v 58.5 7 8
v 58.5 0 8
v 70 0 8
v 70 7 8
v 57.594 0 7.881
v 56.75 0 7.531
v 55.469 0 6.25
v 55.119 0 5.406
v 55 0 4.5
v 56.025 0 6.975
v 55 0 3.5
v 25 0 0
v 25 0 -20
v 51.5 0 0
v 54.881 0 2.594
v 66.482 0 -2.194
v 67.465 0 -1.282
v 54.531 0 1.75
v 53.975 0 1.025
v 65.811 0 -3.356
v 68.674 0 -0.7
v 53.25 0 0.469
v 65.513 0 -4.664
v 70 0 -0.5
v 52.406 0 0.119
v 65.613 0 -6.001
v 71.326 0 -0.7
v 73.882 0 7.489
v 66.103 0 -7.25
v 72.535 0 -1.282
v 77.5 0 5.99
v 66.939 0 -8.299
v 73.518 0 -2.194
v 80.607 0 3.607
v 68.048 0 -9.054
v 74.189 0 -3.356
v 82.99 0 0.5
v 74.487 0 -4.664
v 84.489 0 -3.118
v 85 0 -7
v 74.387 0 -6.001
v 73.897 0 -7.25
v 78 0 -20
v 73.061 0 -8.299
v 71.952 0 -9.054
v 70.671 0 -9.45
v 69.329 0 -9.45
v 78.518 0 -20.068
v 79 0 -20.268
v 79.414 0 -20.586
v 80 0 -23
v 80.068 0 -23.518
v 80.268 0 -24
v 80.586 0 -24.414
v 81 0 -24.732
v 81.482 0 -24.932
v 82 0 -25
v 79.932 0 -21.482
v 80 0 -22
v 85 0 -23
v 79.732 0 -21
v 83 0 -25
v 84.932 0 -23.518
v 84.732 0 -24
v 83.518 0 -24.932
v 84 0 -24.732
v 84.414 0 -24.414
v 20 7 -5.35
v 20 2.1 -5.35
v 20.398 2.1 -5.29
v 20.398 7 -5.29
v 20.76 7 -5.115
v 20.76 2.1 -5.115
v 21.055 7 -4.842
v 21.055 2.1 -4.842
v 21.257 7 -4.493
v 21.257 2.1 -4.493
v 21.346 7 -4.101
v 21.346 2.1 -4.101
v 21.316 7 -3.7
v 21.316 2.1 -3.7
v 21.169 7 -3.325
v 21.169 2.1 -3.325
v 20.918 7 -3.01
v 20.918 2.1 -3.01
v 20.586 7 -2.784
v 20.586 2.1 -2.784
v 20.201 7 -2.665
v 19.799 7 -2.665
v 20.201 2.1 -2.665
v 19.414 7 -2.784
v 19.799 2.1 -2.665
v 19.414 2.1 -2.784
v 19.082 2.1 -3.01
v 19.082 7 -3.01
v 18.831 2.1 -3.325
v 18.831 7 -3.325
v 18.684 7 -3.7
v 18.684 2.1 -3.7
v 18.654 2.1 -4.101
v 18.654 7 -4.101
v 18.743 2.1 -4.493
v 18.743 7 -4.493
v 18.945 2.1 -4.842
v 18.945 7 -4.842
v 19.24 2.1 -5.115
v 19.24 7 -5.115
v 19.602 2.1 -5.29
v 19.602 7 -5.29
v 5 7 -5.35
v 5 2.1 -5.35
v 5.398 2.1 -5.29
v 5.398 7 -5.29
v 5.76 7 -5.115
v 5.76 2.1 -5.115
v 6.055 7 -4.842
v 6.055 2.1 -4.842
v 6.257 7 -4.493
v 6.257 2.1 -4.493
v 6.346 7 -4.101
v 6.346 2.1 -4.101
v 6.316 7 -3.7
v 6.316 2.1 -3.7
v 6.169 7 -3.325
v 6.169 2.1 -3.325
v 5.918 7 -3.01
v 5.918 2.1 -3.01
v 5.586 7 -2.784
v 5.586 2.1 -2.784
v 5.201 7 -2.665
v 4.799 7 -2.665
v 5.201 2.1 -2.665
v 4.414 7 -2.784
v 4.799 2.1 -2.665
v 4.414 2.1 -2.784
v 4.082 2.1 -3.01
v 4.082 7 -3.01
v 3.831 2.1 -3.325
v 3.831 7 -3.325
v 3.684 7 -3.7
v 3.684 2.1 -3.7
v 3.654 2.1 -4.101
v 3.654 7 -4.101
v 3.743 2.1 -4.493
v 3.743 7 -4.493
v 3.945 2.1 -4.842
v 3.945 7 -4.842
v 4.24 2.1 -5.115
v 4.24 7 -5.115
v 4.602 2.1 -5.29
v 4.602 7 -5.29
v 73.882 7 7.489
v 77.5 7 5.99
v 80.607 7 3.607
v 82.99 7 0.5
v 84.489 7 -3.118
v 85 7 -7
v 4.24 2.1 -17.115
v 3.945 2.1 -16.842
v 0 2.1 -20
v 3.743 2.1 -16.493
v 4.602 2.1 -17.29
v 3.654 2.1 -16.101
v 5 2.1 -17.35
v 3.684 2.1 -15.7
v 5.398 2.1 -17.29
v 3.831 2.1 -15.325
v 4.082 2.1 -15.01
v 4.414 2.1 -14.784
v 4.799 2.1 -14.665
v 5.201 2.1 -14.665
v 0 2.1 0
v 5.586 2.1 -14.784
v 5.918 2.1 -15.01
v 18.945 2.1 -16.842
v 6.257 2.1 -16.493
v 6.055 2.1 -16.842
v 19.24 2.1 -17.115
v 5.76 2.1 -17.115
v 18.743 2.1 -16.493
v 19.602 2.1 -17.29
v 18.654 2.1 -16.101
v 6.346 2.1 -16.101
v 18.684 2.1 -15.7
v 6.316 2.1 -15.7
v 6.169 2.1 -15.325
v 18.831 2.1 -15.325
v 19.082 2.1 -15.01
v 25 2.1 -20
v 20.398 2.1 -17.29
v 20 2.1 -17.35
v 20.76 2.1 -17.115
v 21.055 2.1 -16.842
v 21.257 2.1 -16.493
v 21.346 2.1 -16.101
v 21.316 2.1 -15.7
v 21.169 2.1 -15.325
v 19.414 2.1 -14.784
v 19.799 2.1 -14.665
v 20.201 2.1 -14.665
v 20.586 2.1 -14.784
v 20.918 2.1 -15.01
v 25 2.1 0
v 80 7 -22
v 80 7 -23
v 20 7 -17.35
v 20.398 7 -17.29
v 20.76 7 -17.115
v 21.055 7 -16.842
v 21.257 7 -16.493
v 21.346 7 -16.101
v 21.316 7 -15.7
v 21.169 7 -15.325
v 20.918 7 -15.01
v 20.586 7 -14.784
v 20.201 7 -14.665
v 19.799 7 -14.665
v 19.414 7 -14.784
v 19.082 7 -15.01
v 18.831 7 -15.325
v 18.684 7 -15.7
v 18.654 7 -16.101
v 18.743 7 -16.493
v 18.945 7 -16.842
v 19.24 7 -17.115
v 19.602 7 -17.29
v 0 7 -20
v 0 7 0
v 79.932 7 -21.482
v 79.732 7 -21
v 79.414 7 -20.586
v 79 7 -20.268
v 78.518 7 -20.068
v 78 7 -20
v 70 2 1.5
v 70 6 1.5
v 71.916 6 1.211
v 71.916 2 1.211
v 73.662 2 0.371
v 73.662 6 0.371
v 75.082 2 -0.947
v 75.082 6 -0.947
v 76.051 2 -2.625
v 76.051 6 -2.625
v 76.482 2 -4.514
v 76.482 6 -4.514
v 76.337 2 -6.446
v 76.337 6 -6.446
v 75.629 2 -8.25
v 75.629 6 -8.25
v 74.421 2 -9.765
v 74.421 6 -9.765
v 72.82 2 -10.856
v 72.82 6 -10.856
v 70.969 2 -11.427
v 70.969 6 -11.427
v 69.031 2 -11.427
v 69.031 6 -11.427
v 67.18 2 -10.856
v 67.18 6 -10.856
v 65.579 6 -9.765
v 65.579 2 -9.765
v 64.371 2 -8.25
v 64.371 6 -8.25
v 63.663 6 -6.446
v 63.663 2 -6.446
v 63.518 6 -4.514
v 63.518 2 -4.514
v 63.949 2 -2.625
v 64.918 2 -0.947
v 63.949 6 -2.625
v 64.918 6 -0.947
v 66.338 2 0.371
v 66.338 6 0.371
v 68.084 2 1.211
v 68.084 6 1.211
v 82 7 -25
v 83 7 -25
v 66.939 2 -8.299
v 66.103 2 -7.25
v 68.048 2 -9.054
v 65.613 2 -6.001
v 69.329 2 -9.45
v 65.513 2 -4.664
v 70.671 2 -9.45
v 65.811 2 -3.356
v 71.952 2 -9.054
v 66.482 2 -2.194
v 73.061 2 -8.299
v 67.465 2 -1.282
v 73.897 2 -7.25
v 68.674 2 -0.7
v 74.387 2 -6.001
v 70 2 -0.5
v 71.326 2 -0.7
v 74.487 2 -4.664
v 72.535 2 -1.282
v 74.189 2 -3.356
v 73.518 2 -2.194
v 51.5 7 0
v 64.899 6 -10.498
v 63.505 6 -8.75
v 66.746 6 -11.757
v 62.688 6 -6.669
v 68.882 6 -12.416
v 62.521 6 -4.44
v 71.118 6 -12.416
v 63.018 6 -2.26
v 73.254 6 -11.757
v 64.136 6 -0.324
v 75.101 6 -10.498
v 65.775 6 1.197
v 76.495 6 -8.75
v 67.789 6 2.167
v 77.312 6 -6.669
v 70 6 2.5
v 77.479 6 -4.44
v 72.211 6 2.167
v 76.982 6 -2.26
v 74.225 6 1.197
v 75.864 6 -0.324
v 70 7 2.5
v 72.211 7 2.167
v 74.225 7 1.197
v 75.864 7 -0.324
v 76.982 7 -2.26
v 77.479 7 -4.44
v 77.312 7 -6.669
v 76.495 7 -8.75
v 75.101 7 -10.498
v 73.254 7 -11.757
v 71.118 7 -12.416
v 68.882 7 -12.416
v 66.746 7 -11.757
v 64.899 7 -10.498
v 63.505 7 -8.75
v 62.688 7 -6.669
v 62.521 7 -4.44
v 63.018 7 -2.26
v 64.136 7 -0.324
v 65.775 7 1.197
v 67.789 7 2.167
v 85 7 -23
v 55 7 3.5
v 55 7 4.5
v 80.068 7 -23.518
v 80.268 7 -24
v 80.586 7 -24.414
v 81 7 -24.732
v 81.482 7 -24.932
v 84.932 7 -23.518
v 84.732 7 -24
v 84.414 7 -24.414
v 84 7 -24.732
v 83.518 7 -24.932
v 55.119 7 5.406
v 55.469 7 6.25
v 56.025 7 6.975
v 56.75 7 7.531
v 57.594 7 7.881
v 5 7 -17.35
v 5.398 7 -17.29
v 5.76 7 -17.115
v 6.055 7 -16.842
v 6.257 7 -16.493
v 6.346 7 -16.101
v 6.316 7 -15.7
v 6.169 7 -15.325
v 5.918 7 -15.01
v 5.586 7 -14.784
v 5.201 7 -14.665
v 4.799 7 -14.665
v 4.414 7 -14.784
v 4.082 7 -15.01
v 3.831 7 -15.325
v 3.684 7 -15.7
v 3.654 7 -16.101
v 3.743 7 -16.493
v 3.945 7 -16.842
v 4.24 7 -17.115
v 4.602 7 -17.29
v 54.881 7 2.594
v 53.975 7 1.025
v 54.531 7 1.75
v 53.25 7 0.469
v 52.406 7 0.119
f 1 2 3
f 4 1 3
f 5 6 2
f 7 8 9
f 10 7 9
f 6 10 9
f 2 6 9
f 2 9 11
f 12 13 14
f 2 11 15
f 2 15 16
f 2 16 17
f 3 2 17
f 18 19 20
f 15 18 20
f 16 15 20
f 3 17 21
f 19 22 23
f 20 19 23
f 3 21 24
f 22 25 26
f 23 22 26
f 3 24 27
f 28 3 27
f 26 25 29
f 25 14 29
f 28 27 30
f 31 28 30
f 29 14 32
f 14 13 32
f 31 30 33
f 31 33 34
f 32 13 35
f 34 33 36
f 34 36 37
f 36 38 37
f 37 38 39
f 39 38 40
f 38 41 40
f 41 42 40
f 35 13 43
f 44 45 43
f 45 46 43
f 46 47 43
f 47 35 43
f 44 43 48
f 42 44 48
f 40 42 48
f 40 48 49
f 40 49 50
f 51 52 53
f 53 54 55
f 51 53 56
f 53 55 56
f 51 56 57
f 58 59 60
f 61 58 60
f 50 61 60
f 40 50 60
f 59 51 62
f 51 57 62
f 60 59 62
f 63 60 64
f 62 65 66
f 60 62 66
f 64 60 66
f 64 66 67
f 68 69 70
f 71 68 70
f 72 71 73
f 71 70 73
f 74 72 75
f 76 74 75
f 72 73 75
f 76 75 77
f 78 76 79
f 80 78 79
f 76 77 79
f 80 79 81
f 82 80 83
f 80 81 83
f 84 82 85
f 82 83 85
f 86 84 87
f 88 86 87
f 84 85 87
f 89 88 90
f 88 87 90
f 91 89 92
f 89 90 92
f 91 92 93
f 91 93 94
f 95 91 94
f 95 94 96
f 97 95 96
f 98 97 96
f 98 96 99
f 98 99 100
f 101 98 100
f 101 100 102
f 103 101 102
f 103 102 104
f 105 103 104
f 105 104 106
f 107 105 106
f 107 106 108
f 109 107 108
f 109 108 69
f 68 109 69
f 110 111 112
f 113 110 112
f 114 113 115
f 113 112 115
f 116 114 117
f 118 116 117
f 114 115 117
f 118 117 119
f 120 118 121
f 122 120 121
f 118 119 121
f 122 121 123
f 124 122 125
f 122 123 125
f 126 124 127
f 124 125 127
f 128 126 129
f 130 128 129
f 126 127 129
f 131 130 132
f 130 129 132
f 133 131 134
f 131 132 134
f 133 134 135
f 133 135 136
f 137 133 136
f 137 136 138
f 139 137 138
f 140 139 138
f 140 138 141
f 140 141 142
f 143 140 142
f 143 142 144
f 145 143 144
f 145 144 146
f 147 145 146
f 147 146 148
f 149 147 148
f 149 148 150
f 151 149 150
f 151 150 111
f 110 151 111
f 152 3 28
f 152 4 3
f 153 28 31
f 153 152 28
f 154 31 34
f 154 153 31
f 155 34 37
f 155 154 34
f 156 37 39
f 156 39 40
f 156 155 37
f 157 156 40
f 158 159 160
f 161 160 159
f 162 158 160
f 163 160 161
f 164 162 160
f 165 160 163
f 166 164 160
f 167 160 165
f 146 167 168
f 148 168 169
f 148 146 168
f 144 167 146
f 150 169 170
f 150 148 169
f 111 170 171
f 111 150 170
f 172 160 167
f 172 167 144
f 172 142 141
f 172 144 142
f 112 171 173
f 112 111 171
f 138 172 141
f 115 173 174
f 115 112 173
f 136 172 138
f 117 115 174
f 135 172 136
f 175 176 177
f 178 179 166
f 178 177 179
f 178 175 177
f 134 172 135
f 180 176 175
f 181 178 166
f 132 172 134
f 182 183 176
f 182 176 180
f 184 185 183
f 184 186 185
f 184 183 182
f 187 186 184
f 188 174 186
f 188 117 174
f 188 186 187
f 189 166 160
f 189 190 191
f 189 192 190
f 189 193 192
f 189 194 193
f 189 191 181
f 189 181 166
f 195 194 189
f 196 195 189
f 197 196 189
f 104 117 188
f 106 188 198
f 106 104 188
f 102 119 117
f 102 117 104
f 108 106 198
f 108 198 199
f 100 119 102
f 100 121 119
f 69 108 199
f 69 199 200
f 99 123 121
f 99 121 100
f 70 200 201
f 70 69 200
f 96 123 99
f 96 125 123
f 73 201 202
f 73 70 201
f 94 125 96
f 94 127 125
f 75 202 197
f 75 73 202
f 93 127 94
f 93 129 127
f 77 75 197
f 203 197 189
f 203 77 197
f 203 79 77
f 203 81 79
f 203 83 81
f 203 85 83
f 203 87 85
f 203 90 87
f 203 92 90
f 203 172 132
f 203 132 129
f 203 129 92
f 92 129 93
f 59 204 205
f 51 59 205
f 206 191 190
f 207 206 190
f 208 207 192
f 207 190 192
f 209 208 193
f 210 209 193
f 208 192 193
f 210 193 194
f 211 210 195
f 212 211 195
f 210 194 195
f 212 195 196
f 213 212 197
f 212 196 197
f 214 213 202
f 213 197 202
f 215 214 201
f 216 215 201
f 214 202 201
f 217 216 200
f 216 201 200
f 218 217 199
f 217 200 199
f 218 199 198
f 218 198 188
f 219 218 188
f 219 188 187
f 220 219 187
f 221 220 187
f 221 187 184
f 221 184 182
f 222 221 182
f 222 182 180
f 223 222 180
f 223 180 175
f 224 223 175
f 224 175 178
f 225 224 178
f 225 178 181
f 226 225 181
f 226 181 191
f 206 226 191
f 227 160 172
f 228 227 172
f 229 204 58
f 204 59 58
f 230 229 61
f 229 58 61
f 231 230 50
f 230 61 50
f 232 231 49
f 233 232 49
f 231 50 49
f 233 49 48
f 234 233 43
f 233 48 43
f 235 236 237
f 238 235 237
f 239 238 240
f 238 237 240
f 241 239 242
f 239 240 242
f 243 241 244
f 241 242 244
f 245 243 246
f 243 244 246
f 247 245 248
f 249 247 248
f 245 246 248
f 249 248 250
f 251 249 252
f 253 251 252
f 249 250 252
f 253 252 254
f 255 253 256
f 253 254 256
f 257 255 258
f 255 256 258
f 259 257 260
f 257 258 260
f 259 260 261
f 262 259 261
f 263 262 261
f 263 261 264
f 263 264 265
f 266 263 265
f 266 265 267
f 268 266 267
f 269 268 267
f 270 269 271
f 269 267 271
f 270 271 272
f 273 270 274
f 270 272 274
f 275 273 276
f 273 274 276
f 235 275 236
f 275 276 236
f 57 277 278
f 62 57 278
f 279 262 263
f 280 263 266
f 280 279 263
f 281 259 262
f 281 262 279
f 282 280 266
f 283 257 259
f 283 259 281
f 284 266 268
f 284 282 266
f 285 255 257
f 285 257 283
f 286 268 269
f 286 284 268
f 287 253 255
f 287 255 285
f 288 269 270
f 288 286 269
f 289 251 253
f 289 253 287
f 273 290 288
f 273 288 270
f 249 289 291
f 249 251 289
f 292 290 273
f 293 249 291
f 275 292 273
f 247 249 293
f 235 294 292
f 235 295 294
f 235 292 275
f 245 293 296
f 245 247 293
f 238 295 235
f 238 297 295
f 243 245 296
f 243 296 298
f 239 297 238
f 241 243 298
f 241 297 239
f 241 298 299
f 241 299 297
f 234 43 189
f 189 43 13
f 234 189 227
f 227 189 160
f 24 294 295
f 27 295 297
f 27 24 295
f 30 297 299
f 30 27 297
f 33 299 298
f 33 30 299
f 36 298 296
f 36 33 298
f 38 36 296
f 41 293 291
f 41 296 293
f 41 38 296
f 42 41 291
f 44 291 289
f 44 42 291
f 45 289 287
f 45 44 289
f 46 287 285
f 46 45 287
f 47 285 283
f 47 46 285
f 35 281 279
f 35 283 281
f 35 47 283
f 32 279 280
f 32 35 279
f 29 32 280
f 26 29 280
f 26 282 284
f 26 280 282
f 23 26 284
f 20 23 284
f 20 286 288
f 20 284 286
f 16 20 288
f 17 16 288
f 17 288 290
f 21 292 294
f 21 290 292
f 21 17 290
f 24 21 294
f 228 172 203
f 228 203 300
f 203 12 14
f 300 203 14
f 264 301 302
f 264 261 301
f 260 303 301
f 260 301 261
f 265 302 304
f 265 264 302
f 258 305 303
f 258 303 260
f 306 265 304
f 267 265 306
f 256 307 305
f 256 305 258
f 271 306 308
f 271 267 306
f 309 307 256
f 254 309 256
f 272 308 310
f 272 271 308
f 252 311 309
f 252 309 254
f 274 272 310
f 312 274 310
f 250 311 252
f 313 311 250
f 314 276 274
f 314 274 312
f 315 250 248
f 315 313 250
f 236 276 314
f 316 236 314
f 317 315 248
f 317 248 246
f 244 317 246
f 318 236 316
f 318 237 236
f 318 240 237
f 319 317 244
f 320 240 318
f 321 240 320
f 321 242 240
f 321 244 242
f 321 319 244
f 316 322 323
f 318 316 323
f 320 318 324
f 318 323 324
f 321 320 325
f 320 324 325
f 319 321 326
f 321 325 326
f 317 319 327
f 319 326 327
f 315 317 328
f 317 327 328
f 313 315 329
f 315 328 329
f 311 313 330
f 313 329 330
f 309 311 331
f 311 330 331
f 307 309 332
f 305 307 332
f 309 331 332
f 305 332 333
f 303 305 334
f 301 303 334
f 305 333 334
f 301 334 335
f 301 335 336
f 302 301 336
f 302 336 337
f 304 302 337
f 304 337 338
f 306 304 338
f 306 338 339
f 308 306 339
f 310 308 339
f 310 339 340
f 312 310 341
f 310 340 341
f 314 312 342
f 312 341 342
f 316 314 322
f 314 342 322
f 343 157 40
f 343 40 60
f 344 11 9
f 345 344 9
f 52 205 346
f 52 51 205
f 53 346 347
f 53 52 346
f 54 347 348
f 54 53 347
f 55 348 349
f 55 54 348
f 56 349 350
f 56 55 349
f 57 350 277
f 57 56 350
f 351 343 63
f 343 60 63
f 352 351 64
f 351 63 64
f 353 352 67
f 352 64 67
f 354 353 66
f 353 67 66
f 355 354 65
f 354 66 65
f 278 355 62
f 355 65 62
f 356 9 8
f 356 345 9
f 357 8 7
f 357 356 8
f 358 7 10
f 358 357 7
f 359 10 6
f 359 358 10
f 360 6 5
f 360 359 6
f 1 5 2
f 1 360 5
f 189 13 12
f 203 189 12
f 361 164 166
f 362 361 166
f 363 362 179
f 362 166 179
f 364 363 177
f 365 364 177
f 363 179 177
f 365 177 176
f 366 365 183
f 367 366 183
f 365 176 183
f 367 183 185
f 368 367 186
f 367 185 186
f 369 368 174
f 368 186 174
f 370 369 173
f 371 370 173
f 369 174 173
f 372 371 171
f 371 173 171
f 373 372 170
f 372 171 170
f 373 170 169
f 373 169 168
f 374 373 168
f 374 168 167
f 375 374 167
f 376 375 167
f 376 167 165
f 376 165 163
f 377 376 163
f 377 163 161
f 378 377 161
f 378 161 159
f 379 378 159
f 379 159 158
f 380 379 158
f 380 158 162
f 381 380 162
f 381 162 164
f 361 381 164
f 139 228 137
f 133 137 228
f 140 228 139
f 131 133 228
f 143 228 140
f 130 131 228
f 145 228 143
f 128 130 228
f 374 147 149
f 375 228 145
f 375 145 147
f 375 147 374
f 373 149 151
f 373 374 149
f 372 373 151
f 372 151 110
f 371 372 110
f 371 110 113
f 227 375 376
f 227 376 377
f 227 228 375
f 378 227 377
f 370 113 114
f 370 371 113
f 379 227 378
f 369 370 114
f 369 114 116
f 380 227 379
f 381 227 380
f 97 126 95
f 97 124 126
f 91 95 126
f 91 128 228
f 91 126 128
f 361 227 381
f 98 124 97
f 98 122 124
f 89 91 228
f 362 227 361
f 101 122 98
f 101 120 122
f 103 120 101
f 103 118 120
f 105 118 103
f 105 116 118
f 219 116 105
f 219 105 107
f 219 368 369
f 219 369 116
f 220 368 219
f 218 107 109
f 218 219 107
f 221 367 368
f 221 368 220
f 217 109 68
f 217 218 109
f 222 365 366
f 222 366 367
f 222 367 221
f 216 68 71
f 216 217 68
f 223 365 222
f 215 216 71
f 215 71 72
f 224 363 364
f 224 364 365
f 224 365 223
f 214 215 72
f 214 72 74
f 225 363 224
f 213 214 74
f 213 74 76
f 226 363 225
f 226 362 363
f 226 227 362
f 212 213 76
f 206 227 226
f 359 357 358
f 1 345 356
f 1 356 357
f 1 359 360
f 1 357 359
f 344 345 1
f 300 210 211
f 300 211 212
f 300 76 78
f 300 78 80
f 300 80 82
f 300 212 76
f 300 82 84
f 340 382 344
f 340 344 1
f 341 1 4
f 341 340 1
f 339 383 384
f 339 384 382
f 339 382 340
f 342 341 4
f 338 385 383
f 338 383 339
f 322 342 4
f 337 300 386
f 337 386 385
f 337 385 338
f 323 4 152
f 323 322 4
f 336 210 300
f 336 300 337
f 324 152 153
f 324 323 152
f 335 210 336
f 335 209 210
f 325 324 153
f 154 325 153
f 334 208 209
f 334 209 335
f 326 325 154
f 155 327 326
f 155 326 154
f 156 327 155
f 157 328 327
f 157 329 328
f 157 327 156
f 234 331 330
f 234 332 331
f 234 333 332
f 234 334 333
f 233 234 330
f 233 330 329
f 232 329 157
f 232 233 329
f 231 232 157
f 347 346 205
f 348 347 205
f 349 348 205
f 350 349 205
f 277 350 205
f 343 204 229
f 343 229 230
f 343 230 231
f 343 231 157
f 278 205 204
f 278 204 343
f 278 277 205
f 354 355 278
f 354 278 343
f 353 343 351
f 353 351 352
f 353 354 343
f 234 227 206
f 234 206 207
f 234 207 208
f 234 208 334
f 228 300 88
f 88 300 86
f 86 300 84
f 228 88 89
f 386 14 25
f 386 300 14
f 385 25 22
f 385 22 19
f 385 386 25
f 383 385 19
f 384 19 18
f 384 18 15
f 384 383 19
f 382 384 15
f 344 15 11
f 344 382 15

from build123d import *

# Parameters (mm, degrees)
SKETCH1_R           = 4.5
BOSS_EXTRUDE1_DEPTH = 7
SKETCH2_W           = 25
SKETCH2_H           = 20
CUT_EXTRUDE1_DEPTH  = 2.1
SKETCH3_R           = 1.35
CUT_EXTRUDE2_DEPTH  = 14
FILLET2_R           = 3.5
SKETCH4_R           = 7.5
CUT_EXTRUDE3_DEPTH  = 1
SKETCH5_R           = 6.5
CUT_EXTRUDE4_DEPTH  = 4
FILLET3_R           = 15
SKETCH6_W           = 5
SKETCH6_H           = 5
BOSS_EXTRUDE2_DEPTH = 7
FILLET4_R           = 2


with BuildPart() as part:
    # Sketch1 → Boss-Extrude1 (new body)
    with BuildSketch(Plane(origin=(0, 0, 0), x_dir=(1, 0, 0), z_dir=(0, 1, 0))):
        Polygon((0, 0), (55, 0), (55, -8), (85, -8), (85, 0), (85, 20), (0, 20), align=None)
        with Locations(Location((70, 5, 0), (0, 0, 270))):
            Circle(SKETCH1_R, mode=Mode.SUBTRACT)
    extrude(amount=BOSS_EXTRUDE1_DEPTH)

    # Sketch2 → Cut-Extrude1 (cut)
    with BuildSketch(Plane.XZ):
        with Locations((12.5, -10)):
            Rectangle(SKETCH2_W, SKETCH2_H)
    extrude(amount=-CUT_EXTRUDE1_DEPTH, mode=Mode.SUBTRACT)

    # Sketch3 → Cut-Extrude2 (cut)
    with BuildSketch(Plane.XZ.offset(-2.1)):
        with Locations(Location((5, -4, 0), (0, 0, 270))):
            Circle(SKETCH3_R)
        with Locations(Location((20, -4, 0), (0, 0, 270))):
            Circle(SKETCH3_R)
        with Locations(Location((20, -16, 0), (0, 0, 270))):
            Circle(SKETCH3_R)
        with Locations(Location((5, -16, 0), (0, 0, 270))):
            Circle(SKETCH3_R)
    extrude(amount=-CUT_EXTRUDE2_DEPTH, mode=Mode.SUBTRACT)

    # Fillet2
    fillet2_edges = [part.edges().sort_by_distance(p)[0] for p in [
        (55, 3.5, 8),
        (55, 3.5, 0),
    ]]
    fillet(fillet2_edges, radius=FILLET2_R)

    # Sketch4 → Cut-Extrude3 (cut)
    with BuildSketch(Plane(origin=(0, 7, 0), x_dir=(1, 0, 0), z_dir=(0, 1, 0))):
        with Locations(Location((70, 5, 0), (0, 0, 270))):
            Circle(SKETCH4_R)
    extrude(amount=-CUT_EXTRUDE3_DEPTH, mode=Mode.SUBTRACT)

    # Sketch5 → Cut-Extrude4 (cut)
    with BuildSketch(Plane(origin=(0, 6, 0), x_dir=(1, 0, 0), z_dir=(0, 1, 0))):
        with Locations(Location((70, 5, 0), (0, 0, 270))):
            Circle(SKETCH5_R)
    extrude(amount=-CUT_EXTRUDE4_DEPTH, mode=Mode.SUBTRACT)

    # Fillet3
    fillet3_edges = [part.edges().sort_by_distance(p)[0] for p in [
        (85, 3.5, 8),
    ]]
    fillet(fillet3_edges, radius=FILLET3_R)

    # Sketch6 → Boss-Extrude2 (add)
    with BuildSketch(Plane(origin=(0, 7, 0), x_dir=(1, 0, 0), z_dir=(0, 1, 0))):
        with Locations((82.5, 22.5)):
            Rectangle(SKETCH6_W, SKETCH6_H)
    extrude(amount=-BOSS_EXTRUDE2_DEPTH)

    # Fillet4
    fillet4_edges = [part.edges().sort_by_distance(p)[0] for p in [
        (80, 3.5, -25),
        (80, 3.5, -20),
        (85, 3.5, -25),
    ]]
    fillet(fillet4_edges, radius=FILLET4_R)


solid = part.part
